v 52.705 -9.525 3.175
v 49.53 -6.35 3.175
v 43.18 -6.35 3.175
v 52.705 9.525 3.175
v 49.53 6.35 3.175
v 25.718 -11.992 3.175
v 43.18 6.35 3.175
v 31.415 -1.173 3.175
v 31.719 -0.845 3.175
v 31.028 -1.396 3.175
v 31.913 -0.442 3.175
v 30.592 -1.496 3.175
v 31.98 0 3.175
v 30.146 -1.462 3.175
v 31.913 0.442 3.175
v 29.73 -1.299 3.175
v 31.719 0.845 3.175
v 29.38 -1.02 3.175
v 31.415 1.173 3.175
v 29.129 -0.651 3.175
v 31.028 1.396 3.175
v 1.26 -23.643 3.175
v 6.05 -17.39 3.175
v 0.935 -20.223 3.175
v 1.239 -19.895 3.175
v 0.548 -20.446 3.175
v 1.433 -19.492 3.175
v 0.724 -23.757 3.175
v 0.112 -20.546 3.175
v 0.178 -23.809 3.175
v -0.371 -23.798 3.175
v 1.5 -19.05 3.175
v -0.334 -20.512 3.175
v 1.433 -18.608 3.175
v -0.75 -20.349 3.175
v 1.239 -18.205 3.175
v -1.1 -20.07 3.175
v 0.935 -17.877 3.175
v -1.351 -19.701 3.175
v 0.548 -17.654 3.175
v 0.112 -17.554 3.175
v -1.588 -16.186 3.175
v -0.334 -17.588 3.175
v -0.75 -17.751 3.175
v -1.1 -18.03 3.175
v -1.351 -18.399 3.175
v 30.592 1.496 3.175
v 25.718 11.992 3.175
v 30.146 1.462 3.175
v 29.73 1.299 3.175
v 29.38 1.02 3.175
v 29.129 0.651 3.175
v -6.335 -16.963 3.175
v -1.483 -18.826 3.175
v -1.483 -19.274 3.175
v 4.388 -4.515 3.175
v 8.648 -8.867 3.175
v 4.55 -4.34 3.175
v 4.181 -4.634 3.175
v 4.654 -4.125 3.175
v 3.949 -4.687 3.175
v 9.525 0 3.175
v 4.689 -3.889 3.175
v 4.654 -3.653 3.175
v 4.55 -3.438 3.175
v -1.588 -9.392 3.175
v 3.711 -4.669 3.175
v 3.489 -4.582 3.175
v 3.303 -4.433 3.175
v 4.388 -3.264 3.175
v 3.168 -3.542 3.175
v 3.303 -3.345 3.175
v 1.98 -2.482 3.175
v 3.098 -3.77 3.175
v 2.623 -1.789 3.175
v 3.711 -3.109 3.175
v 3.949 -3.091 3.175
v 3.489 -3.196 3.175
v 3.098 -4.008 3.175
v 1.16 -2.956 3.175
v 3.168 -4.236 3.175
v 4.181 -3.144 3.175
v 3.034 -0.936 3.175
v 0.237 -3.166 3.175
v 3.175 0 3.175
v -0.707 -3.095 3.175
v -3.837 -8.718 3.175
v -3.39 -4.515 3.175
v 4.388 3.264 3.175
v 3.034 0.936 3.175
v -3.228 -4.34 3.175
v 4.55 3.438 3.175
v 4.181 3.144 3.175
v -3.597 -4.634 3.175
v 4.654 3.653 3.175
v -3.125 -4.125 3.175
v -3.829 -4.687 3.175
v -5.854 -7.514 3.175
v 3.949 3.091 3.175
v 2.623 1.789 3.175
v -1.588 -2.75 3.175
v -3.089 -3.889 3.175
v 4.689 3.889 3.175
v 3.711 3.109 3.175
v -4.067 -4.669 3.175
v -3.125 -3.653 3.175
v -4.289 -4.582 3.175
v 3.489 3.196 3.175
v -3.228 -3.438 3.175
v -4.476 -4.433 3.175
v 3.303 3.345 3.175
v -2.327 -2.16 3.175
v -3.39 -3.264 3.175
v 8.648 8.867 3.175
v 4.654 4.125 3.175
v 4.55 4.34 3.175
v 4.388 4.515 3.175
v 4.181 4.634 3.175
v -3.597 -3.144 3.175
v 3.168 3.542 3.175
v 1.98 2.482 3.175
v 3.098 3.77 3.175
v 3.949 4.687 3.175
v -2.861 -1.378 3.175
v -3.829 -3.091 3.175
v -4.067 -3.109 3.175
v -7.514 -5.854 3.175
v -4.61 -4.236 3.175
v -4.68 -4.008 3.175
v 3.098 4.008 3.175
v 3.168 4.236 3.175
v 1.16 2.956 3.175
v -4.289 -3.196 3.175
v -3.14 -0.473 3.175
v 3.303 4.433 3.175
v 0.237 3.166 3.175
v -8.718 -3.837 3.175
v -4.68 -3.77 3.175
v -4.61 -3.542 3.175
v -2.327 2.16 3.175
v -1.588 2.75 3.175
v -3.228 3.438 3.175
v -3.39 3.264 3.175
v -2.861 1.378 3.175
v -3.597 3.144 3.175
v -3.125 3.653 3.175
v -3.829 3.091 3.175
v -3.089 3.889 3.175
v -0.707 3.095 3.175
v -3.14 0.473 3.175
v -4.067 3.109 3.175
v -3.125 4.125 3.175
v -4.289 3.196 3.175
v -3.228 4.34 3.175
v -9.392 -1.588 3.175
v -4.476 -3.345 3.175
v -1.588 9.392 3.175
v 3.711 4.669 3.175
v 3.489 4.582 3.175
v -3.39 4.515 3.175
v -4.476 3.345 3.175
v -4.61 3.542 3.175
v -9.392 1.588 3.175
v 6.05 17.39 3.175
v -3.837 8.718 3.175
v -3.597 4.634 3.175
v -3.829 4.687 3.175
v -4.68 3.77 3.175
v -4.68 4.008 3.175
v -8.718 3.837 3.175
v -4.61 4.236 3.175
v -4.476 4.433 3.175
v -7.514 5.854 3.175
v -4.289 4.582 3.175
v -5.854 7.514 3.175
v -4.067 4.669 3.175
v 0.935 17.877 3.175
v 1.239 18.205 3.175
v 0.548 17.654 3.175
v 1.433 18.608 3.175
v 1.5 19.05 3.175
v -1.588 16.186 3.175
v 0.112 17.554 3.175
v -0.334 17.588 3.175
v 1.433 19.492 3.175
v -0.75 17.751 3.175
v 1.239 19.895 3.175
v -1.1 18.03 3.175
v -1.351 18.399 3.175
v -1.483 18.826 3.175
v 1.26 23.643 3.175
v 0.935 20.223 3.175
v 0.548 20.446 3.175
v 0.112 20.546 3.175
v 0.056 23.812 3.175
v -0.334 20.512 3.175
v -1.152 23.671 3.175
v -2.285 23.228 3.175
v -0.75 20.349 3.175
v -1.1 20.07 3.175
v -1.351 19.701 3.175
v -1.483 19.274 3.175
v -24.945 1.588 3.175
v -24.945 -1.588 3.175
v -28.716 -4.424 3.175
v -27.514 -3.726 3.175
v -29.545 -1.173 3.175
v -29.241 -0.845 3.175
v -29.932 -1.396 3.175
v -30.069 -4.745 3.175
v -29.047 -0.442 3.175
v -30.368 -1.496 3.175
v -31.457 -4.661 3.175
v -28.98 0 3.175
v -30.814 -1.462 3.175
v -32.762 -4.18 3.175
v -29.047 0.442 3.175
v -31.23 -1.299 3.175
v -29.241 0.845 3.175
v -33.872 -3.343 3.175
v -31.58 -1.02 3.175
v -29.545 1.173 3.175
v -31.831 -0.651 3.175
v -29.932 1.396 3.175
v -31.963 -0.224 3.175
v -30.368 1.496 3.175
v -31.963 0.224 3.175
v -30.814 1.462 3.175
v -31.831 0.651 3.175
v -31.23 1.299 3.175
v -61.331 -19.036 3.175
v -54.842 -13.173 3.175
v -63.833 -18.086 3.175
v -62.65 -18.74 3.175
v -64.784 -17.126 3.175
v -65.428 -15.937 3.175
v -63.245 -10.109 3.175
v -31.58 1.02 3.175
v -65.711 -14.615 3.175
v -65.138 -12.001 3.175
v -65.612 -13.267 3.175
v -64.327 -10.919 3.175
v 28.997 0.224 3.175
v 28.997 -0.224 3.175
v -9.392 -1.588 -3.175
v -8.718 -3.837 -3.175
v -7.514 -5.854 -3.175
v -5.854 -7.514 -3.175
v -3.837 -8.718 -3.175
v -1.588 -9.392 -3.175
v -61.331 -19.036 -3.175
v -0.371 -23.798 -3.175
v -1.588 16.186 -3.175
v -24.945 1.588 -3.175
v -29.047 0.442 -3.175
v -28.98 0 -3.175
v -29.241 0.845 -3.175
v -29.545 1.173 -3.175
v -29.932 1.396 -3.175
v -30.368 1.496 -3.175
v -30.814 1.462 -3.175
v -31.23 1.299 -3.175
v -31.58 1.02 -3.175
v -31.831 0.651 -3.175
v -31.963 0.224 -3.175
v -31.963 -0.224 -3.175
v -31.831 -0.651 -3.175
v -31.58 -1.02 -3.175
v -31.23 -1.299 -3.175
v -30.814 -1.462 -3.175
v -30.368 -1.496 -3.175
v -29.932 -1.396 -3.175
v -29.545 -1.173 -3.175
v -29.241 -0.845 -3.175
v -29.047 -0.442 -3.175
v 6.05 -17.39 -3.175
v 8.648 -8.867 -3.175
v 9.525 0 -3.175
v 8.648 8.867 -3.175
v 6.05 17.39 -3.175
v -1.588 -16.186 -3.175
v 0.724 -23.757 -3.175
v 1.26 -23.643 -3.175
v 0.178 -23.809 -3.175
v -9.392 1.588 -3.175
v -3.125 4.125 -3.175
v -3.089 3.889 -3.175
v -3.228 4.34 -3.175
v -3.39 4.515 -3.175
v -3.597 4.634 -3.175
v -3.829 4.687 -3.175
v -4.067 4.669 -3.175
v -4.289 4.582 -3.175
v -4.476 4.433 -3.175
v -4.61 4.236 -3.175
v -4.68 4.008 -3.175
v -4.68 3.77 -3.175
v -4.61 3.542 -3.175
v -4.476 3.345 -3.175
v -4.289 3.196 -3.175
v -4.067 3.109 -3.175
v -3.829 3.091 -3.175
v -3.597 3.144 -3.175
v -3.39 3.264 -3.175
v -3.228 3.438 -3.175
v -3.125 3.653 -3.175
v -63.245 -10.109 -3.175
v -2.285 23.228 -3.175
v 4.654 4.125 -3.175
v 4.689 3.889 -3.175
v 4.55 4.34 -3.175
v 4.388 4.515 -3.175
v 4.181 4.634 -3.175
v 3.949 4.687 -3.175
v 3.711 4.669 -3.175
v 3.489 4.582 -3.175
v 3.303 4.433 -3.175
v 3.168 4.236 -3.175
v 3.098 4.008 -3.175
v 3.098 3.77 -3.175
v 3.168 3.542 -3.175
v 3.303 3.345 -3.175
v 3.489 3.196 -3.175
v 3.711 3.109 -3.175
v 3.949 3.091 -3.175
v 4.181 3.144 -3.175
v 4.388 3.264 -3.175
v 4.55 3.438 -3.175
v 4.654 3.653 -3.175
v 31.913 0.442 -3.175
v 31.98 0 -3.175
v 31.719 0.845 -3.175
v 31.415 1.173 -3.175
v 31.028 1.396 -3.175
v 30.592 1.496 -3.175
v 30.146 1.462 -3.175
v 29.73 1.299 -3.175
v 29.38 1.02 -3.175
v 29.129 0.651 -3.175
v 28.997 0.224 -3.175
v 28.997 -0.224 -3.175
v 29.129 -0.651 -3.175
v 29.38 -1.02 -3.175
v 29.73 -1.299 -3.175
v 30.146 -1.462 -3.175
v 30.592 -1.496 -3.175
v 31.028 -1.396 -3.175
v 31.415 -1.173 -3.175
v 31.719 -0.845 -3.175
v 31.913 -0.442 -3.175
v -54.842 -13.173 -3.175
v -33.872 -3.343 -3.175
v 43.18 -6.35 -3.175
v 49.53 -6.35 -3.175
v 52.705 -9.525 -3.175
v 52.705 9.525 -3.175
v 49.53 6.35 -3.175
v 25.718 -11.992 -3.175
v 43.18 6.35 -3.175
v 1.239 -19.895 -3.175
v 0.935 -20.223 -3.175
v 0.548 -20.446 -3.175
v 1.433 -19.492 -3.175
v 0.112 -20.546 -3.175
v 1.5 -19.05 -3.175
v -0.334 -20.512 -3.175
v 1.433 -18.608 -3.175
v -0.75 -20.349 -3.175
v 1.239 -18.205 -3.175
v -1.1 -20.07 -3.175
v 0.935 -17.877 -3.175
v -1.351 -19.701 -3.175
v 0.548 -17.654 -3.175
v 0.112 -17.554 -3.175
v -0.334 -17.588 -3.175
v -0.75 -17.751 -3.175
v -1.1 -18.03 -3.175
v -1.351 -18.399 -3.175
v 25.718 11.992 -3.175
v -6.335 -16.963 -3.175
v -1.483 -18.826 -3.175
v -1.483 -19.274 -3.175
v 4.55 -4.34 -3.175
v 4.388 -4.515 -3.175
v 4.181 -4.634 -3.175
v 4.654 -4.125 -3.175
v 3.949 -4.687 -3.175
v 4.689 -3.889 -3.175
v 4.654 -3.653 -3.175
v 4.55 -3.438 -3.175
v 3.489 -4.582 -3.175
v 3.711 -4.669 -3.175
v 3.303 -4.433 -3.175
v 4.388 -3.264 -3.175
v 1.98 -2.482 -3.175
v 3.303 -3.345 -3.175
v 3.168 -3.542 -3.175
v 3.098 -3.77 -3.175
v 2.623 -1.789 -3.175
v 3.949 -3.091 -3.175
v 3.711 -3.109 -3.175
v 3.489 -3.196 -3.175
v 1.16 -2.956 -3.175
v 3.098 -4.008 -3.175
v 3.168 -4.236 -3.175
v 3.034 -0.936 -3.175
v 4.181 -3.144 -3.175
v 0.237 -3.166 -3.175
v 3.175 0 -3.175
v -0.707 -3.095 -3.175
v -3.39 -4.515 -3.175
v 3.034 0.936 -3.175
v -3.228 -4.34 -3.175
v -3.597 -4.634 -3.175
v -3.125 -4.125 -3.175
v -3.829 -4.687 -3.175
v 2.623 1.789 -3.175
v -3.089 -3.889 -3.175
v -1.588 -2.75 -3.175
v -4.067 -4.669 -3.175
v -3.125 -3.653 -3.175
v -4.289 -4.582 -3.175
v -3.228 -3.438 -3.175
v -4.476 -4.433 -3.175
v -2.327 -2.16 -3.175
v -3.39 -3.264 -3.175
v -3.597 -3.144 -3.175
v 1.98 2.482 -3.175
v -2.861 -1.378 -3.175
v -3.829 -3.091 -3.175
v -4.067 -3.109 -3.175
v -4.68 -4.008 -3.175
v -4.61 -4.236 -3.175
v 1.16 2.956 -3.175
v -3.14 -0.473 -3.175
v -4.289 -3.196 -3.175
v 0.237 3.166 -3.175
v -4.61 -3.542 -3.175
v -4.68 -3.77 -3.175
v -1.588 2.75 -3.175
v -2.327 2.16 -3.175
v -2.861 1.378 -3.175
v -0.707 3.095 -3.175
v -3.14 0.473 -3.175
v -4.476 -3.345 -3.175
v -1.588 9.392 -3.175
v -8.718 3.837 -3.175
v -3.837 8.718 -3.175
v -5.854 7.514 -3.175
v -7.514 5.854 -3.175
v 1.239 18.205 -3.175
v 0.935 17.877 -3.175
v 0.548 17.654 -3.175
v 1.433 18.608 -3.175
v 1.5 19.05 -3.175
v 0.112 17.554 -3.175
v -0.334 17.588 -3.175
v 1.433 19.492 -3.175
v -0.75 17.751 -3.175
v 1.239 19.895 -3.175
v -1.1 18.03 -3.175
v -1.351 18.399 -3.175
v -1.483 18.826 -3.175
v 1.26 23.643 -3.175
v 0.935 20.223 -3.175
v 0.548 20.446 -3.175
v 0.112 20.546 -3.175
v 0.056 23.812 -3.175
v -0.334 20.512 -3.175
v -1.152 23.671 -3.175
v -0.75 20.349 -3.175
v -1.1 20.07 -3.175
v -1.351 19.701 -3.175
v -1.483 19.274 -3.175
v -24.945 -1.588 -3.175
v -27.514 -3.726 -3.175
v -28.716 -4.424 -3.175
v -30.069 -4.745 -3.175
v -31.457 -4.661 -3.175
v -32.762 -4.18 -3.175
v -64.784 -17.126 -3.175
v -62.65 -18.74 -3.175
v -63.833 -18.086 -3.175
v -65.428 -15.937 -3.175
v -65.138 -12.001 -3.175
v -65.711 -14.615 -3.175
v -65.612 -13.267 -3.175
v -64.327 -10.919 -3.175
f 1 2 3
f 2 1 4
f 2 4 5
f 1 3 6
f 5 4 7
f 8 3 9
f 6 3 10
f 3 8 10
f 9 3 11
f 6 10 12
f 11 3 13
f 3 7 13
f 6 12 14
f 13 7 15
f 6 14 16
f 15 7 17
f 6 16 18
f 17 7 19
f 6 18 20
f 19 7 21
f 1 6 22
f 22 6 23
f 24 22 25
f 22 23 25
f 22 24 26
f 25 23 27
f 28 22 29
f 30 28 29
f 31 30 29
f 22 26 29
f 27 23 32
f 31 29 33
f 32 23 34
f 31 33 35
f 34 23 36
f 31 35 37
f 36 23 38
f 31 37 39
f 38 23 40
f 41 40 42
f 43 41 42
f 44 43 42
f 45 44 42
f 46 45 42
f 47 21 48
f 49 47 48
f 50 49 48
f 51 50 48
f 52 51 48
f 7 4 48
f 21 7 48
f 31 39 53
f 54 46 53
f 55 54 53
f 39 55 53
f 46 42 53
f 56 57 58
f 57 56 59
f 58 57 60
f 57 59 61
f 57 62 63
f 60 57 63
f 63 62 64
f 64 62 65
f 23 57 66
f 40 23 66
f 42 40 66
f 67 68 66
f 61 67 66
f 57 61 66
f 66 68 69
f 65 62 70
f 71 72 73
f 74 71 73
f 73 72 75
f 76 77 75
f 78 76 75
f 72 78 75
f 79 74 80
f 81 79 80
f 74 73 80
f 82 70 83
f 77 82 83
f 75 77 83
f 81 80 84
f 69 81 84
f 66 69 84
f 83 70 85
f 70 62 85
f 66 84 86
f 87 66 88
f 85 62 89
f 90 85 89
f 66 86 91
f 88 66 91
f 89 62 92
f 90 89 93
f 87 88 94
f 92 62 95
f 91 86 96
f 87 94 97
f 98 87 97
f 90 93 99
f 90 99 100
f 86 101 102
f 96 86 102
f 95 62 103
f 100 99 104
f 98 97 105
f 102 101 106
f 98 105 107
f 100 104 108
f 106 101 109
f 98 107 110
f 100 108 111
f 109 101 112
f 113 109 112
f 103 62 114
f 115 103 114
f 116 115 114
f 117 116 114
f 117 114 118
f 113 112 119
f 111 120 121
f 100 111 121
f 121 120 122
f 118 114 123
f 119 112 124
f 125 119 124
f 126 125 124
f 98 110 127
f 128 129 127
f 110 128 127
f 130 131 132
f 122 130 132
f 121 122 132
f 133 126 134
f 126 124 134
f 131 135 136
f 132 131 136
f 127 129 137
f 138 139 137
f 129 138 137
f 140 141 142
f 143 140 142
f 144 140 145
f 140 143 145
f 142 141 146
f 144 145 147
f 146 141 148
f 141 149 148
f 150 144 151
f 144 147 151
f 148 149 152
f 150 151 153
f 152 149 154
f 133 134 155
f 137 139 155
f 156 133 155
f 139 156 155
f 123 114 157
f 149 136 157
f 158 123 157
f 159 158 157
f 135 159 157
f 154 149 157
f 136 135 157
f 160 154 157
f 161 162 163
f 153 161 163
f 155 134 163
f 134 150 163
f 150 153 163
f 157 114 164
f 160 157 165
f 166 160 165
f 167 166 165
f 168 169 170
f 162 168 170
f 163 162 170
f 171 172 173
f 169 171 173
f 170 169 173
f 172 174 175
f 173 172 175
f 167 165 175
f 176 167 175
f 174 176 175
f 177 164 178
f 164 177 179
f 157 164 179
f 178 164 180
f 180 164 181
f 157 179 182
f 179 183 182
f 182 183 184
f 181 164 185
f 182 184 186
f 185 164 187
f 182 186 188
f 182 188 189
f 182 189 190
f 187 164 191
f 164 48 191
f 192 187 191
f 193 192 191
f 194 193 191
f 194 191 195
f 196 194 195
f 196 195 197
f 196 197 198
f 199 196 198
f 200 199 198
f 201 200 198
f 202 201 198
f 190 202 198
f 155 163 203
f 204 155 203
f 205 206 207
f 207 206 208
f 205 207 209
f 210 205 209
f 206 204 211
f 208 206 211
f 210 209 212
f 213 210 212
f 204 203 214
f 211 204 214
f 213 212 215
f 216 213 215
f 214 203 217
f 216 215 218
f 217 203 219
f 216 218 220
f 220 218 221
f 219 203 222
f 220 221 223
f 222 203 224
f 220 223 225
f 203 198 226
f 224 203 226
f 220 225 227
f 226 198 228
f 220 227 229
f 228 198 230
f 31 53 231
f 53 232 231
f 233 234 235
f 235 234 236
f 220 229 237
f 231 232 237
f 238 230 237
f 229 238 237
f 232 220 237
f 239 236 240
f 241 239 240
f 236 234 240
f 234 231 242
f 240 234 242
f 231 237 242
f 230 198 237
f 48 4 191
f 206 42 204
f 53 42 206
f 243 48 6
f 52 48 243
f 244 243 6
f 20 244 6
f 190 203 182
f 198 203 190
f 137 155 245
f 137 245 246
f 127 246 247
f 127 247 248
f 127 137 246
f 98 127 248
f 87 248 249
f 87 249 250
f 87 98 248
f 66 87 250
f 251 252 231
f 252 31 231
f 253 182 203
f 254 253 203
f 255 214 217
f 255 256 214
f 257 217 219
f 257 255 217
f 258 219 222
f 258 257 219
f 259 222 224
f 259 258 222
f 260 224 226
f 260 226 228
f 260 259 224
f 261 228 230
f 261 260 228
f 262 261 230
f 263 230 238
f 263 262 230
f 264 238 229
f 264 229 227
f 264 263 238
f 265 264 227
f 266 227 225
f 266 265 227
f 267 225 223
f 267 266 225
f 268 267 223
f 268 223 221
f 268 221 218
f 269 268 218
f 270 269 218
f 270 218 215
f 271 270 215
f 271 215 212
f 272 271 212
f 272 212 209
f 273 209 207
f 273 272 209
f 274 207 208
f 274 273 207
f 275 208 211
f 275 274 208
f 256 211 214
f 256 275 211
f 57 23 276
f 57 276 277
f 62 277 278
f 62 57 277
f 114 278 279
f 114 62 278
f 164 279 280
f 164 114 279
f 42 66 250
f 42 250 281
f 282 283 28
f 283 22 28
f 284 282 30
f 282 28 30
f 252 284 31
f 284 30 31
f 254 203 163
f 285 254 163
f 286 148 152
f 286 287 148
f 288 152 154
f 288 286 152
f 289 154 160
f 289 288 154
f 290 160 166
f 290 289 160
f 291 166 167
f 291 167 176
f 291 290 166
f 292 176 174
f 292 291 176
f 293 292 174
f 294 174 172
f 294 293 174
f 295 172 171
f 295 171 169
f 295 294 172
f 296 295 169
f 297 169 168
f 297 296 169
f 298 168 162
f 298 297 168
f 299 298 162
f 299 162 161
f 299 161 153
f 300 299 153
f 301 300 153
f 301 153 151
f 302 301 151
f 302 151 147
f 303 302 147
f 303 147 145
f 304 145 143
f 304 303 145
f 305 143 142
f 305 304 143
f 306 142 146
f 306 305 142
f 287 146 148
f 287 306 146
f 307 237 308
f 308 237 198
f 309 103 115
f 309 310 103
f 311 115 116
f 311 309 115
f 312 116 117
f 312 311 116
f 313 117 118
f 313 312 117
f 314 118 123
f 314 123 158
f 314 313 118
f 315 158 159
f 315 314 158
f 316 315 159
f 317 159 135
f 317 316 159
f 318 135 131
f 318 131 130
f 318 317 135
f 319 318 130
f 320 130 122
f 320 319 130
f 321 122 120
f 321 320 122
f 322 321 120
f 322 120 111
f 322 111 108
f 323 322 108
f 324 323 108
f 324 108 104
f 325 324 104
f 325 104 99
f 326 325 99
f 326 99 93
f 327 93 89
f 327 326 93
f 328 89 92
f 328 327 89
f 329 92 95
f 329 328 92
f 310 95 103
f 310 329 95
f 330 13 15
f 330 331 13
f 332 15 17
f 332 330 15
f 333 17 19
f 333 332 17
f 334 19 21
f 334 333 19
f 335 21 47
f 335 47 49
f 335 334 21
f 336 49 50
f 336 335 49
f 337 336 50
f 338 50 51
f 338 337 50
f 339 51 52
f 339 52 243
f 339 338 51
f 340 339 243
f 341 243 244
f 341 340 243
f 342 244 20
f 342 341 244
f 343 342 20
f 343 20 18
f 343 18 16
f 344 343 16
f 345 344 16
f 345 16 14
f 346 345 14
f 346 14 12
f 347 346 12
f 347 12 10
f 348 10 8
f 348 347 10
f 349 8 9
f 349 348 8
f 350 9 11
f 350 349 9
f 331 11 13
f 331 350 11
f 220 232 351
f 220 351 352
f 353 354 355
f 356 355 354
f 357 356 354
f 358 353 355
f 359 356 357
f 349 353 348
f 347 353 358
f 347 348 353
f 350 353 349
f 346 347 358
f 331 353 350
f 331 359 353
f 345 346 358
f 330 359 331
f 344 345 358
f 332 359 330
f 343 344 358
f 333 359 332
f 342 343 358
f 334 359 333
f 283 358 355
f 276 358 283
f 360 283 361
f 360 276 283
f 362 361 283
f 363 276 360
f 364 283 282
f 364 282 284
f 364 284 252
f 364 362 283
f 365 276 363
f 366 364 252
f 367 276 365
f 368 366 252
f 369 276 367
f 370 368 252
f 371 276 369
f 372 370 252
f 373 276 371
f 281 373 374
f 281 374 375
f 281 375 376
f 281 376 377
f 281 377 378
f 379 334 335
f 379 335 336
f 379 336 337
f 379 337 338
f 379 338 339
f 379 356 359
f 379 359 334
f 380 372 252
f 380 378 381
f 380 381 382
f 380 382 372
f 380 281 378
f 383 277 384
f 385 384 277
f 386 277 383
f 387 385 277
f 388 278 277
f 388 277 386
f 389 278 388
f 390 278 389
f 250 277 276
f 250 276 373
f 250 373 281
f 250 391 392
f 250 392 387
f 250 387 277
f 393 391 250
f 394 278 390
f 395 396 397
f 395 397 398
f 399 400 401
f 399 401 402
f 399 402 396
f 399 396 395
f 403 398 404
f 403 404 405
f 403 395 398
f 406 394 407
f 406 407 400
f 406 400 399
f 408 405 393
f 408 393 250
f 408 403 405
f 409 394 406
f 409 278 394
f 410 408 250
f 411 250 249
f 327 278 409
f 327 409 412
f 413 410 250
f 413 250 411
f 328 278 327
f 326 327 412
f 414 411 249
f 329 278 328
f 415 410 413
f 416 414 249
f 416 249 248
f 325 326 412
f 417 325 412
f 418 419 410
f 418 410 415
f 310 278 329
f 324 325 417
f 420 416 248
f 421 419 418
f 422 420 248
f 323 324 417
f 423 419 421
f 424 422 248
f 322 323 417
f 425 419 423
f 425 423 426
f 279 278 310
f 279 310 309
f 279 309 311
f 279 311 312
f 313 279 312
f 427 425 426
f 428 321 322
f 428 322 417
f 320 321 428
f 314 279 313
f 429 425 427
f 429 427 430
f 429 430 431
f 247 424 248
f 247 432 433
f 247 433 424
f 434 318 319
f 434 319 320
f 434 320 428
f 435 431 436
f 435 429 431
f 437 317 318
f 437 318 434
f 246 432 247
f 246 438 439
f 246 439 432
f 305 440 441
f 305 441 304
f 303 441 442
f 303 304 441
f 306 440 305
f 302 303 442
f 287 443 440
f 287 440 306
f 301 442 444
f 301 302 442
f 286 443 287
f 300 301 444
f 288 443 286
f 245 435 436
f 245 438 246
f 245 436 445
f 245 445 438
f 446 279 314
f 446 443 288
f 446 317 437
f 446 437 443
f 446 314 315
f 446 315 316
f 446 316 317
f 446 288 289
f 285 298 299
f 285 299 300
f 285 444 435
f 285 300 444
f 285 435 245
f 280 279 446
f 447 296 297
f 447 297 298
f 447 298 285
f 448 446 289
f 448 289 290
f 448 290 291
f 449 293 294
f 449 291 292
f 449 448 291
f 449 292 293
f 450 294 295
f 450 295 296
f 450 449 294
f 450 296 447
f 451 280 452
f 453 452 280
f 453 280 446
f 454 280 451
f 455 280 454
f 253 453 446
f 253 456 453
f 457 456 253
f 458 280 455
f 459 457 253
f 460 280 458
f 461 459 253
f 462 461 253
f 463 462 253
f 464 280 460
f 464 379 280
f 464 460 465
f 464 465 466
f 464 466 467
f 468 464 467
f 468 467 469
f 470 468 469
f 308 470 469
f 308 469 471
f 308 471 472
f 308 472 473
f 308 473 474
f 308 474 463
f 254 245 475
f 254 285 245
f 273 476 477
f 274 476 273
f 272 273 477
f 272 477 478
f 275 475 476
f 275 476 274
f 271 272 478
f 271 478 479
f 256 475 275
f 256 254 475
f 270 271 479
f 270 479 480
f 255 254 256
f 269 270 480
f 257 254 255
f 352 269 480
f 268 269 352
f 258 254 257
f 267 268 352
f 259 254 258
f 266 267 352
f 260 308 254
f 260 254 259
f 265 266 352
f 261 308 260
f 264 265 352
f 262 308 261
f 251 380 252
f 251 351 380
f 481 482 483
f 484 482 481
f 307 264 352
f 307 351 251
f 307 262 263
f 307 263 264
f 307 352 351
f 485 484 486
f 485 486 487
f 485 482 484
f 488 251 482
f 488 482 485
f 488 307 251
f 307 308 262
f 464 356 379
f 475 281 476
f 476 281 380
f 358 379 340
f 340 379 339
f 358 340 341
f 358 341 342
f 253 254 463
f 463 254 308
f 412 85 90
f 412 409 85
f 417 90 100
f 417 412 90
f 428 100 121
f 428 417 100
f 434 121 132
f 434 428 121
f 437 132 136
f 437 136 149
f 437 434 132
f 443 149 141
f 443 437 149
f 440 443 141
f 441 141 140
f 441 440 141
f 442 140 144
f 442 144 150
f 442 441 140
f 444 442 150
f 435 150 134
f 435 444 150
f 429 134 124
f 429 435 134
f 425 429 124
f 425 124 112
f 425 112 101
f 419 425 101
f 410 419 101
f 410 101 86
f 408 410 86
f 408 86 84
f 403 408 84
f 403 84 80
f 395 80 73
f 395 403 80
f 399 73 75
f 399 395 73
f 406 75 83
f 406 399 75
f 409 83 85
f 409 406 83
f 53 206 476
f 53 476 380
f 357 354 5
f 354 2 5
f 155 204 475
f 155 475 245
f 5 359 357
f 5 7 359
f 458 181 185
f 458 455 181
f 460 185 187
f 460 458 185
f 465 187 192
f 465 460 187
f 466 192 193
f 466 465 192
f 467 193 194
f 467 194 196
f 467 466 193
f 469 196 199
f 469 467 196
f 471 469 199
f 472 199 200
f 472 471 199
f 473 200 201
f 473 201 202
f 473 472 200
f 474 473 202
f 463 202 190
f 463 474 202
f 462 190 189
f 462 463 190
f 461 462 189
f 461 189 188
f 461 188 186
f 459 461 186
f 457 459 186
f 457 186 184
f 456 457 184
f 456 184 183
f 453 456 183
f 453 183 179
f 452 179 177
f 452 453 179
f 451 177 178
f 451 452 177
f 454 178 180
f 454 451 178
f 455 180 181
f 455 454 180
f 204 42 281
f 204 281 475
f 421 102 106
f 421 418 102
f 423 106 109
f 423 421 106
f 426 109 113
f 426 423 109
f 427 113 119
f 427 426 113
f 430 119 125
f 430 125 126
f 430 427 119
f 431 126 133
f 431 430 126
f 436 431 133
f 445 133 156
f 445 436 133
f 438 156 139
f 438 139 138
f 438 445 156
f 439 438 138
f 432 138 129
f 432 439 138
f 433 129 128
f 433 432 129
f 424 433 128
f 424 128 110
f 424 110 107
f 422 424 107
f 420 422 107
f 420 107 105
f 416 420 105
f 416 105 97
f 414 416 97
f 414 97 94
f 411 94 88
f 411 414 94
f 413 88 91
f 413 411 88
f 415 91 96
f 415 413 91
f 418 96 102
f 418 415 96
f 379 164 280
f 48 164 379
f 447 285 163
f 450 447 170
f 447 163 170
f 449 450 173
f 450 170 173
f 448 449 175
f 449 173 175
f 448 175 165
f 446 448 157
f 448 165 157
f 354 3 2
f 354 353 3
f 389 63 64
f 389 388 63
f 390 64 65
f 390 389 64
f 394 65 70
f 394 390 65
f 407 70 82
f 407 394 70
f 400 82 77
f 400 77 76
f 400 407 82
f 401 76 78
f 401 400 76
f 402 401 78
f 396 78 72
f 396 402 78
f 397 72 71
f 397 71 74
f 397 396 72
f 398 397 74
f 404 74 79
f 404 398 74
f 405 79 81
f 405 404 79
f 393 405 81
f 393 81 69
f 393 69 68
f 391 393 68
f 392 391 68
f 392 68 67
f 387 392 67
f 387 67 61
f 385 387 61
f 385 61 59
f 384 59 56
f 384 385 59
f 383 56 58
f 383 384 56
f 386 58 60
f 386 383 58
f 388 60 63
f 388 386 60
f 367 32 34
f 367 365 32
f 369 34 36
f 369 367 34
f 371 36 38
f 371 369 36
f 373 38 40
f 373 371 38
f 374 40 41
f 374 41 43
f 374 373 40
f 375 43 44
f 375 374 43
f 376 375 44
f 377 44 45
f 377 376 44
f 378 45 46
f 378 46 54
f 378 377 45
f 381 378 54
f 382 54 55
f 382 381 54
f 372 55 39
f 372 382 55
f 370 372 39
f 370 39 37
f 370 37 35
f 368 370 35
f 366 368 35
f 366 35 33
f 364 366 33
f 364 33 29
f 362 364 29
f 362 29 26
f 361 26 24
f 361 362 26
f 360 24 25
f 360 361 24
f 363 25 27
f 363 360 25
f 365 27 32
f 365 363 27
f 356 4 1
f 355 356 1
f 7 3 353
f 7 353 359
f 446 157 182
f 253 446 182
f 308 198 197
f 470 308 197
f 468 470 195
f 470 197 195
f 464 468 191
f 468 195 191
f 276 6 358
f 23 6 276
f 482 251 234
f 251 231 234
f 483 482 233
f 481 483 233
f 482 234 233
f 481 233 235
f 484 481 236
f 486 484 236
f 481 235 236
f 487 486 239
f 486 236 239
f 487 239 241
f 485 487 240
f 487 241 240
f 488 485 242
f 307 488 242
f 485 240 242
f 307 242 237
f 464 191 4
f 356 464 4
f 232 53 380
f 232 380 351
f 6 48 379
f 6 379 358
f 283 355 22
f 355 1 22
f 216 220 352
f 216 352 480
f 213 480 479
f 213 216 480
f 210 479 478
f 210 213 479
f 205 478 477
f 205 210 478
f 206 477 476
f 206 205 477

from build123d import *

# Parameters (mm, degrees)
SKETCH1_R           = 3.175
SKETCH1_R_2         = 0.8
SKETCH1_R_3         = 1.5
SKETCH1_W           = 6.35
SKETCH1_H           = 12.7
BOSS_EXTRUDE1_DEPTH = 3.175
CUT_EXTRUDE1_DEPTH  = 7.35
CUT_EXTRUDE2_DEPTH  = 7.35


with BuildPart() as part:
    # Sketch1 → Boss-Extrude1 (new body, symmetric)
    with BuildSketch(Plane.XY):
        with BuildLine():
            Line((52.705, 9.525), (52.705, -9.525))
            Line((52.705, -9.525), (1.260352874, -23.642702569))
            ThreePointArc((1.260352874, -23.642702569), (0.451437295, -23.791055855), (-0.370940015, -23.798032198))
            Line((-0.370940015, -23.798032198), (-61.330940015, -19.035532198))
            ThreePointArc((-61.330940015, -19.035532198), (-65.616640497, -15.286051717), (-63.245106279, -10.109019948))
            Line((-63.245106279, -10.109019948), (-2.285106279, 23.228480052))
            ThreePointArc((-2.285106279, 23.228480052), (-0.552652656, 23.780325707), (1.260352874, 23.642702569))
            Line((1.260352874, 23.642702569), (52.705, 9.525))
        make_face()
        Circle(SKETCH1_R, mode=Mode.SUBTRACT)
        with Locations((-3.889087297, 3.889087297)):
            Circle(SKETCH1_R_2, mode=Mode.SUBTRACT)
        with Locations((3.889087297, -3.889087297)):
            Circle(SKETCH1_R_2, mode=Mode.SUBTRACT)
        with Locations((30.48, 0)):
            Circle(SKETCH1_R_3, mode=Mode.SUBTRACT)
        with Locations((-30.48, 0)):
            Circle(SKETCH1_R_3, mode=Mode.SUBTRACT)
        with Locations((3.889087297, 3.889087297)):
            Circle(SKETCH1_R_2, mode=Mode.SUBTRACT)
        with Locations((-3.889087297, -3.889087297)):
            Circle(SKETCH1_R_2, mode=Mode.SUBTRACT)
        with Locations((0, -19.05)):
            Circle(SKETCH1_R_3, mode=Mode.SUBTRACT)
        with Locations((0, 19.05)):
            Circle(SKETCH1_R_3, mode=Mode.SUBTRACT)
        with Locations((46.355, 0)):
            Rectangle(SKETCH1_W, SKETCH1_H, mode=Mode.SUBTRACT)
    extrude(amount=BOSS_EXTRUDE1_DEPTH, both=True)

    # Sketch2 → Cut-Extrude1 (cut, through all)
    with BuildSketch(Plane.XY.offset(3.175)):
        with BuildLine():
            Line((-6.334889923, -16.962749429), (-54.842346338, -13.173104397))
            Line((-54.842346338, -13.173104397), (-33.871837797, -3.343178518))
            ThreePointArc((-33.871837797, -3.343178518), (-30.766203139, -4.753892512), (-27.513752337, -3.72596042))
            Line((-27.513752337, -3.72596042), (-6.334889923, -16.962749429))
        make_face()
        with BuildLine():
            Line((25.7175, 11.992472423), (25.7175, -11.992472423))
            Line((25.7175, -11.992472423), (6.049537699, -17.389854996))
            ThreePointArc((6.049537699, -17.389854996), (9.525, 0), (6.049537699, 17.389854996))
            Line((6.049537699, 17.389854996), (25.7175, 11.992472423))
        make_face()
    extrude(amount=-CUT_EXTRUDE1_DEPTH, mode=Mode.SUBTRACT)

    # Sketch3 → Cut-Extrude2 (cut, through all)
    with BuildSketch(Plane.XY.offset(3.175)):
        with BuildLine():
            Line((-1.5875, -16.185756869), (-24.944710991, -1.5875))
            Line((-24.944710991, -1.5875), (-9.391776656, -1.5875))
            ThreePointArc((-9.391776656, -1.5875), (-6.735192091, -6.735192091), (-1.5875, -9.391776656))
            Line((-1.5875, -9.391776656), (-1.5875, -16.185756869))
        make_face()
    cut_extrude2 = extrude(amount=-CUT_EXTRUDE2_DEPTH, mode=Mode.SUBTRACT)

    # Mirror1: Cut-Extrude2 across plane
    add(cut_extrude2.mirror(Plane.ZX), mode=Mode.SUBTRACT)


solid = part.part
